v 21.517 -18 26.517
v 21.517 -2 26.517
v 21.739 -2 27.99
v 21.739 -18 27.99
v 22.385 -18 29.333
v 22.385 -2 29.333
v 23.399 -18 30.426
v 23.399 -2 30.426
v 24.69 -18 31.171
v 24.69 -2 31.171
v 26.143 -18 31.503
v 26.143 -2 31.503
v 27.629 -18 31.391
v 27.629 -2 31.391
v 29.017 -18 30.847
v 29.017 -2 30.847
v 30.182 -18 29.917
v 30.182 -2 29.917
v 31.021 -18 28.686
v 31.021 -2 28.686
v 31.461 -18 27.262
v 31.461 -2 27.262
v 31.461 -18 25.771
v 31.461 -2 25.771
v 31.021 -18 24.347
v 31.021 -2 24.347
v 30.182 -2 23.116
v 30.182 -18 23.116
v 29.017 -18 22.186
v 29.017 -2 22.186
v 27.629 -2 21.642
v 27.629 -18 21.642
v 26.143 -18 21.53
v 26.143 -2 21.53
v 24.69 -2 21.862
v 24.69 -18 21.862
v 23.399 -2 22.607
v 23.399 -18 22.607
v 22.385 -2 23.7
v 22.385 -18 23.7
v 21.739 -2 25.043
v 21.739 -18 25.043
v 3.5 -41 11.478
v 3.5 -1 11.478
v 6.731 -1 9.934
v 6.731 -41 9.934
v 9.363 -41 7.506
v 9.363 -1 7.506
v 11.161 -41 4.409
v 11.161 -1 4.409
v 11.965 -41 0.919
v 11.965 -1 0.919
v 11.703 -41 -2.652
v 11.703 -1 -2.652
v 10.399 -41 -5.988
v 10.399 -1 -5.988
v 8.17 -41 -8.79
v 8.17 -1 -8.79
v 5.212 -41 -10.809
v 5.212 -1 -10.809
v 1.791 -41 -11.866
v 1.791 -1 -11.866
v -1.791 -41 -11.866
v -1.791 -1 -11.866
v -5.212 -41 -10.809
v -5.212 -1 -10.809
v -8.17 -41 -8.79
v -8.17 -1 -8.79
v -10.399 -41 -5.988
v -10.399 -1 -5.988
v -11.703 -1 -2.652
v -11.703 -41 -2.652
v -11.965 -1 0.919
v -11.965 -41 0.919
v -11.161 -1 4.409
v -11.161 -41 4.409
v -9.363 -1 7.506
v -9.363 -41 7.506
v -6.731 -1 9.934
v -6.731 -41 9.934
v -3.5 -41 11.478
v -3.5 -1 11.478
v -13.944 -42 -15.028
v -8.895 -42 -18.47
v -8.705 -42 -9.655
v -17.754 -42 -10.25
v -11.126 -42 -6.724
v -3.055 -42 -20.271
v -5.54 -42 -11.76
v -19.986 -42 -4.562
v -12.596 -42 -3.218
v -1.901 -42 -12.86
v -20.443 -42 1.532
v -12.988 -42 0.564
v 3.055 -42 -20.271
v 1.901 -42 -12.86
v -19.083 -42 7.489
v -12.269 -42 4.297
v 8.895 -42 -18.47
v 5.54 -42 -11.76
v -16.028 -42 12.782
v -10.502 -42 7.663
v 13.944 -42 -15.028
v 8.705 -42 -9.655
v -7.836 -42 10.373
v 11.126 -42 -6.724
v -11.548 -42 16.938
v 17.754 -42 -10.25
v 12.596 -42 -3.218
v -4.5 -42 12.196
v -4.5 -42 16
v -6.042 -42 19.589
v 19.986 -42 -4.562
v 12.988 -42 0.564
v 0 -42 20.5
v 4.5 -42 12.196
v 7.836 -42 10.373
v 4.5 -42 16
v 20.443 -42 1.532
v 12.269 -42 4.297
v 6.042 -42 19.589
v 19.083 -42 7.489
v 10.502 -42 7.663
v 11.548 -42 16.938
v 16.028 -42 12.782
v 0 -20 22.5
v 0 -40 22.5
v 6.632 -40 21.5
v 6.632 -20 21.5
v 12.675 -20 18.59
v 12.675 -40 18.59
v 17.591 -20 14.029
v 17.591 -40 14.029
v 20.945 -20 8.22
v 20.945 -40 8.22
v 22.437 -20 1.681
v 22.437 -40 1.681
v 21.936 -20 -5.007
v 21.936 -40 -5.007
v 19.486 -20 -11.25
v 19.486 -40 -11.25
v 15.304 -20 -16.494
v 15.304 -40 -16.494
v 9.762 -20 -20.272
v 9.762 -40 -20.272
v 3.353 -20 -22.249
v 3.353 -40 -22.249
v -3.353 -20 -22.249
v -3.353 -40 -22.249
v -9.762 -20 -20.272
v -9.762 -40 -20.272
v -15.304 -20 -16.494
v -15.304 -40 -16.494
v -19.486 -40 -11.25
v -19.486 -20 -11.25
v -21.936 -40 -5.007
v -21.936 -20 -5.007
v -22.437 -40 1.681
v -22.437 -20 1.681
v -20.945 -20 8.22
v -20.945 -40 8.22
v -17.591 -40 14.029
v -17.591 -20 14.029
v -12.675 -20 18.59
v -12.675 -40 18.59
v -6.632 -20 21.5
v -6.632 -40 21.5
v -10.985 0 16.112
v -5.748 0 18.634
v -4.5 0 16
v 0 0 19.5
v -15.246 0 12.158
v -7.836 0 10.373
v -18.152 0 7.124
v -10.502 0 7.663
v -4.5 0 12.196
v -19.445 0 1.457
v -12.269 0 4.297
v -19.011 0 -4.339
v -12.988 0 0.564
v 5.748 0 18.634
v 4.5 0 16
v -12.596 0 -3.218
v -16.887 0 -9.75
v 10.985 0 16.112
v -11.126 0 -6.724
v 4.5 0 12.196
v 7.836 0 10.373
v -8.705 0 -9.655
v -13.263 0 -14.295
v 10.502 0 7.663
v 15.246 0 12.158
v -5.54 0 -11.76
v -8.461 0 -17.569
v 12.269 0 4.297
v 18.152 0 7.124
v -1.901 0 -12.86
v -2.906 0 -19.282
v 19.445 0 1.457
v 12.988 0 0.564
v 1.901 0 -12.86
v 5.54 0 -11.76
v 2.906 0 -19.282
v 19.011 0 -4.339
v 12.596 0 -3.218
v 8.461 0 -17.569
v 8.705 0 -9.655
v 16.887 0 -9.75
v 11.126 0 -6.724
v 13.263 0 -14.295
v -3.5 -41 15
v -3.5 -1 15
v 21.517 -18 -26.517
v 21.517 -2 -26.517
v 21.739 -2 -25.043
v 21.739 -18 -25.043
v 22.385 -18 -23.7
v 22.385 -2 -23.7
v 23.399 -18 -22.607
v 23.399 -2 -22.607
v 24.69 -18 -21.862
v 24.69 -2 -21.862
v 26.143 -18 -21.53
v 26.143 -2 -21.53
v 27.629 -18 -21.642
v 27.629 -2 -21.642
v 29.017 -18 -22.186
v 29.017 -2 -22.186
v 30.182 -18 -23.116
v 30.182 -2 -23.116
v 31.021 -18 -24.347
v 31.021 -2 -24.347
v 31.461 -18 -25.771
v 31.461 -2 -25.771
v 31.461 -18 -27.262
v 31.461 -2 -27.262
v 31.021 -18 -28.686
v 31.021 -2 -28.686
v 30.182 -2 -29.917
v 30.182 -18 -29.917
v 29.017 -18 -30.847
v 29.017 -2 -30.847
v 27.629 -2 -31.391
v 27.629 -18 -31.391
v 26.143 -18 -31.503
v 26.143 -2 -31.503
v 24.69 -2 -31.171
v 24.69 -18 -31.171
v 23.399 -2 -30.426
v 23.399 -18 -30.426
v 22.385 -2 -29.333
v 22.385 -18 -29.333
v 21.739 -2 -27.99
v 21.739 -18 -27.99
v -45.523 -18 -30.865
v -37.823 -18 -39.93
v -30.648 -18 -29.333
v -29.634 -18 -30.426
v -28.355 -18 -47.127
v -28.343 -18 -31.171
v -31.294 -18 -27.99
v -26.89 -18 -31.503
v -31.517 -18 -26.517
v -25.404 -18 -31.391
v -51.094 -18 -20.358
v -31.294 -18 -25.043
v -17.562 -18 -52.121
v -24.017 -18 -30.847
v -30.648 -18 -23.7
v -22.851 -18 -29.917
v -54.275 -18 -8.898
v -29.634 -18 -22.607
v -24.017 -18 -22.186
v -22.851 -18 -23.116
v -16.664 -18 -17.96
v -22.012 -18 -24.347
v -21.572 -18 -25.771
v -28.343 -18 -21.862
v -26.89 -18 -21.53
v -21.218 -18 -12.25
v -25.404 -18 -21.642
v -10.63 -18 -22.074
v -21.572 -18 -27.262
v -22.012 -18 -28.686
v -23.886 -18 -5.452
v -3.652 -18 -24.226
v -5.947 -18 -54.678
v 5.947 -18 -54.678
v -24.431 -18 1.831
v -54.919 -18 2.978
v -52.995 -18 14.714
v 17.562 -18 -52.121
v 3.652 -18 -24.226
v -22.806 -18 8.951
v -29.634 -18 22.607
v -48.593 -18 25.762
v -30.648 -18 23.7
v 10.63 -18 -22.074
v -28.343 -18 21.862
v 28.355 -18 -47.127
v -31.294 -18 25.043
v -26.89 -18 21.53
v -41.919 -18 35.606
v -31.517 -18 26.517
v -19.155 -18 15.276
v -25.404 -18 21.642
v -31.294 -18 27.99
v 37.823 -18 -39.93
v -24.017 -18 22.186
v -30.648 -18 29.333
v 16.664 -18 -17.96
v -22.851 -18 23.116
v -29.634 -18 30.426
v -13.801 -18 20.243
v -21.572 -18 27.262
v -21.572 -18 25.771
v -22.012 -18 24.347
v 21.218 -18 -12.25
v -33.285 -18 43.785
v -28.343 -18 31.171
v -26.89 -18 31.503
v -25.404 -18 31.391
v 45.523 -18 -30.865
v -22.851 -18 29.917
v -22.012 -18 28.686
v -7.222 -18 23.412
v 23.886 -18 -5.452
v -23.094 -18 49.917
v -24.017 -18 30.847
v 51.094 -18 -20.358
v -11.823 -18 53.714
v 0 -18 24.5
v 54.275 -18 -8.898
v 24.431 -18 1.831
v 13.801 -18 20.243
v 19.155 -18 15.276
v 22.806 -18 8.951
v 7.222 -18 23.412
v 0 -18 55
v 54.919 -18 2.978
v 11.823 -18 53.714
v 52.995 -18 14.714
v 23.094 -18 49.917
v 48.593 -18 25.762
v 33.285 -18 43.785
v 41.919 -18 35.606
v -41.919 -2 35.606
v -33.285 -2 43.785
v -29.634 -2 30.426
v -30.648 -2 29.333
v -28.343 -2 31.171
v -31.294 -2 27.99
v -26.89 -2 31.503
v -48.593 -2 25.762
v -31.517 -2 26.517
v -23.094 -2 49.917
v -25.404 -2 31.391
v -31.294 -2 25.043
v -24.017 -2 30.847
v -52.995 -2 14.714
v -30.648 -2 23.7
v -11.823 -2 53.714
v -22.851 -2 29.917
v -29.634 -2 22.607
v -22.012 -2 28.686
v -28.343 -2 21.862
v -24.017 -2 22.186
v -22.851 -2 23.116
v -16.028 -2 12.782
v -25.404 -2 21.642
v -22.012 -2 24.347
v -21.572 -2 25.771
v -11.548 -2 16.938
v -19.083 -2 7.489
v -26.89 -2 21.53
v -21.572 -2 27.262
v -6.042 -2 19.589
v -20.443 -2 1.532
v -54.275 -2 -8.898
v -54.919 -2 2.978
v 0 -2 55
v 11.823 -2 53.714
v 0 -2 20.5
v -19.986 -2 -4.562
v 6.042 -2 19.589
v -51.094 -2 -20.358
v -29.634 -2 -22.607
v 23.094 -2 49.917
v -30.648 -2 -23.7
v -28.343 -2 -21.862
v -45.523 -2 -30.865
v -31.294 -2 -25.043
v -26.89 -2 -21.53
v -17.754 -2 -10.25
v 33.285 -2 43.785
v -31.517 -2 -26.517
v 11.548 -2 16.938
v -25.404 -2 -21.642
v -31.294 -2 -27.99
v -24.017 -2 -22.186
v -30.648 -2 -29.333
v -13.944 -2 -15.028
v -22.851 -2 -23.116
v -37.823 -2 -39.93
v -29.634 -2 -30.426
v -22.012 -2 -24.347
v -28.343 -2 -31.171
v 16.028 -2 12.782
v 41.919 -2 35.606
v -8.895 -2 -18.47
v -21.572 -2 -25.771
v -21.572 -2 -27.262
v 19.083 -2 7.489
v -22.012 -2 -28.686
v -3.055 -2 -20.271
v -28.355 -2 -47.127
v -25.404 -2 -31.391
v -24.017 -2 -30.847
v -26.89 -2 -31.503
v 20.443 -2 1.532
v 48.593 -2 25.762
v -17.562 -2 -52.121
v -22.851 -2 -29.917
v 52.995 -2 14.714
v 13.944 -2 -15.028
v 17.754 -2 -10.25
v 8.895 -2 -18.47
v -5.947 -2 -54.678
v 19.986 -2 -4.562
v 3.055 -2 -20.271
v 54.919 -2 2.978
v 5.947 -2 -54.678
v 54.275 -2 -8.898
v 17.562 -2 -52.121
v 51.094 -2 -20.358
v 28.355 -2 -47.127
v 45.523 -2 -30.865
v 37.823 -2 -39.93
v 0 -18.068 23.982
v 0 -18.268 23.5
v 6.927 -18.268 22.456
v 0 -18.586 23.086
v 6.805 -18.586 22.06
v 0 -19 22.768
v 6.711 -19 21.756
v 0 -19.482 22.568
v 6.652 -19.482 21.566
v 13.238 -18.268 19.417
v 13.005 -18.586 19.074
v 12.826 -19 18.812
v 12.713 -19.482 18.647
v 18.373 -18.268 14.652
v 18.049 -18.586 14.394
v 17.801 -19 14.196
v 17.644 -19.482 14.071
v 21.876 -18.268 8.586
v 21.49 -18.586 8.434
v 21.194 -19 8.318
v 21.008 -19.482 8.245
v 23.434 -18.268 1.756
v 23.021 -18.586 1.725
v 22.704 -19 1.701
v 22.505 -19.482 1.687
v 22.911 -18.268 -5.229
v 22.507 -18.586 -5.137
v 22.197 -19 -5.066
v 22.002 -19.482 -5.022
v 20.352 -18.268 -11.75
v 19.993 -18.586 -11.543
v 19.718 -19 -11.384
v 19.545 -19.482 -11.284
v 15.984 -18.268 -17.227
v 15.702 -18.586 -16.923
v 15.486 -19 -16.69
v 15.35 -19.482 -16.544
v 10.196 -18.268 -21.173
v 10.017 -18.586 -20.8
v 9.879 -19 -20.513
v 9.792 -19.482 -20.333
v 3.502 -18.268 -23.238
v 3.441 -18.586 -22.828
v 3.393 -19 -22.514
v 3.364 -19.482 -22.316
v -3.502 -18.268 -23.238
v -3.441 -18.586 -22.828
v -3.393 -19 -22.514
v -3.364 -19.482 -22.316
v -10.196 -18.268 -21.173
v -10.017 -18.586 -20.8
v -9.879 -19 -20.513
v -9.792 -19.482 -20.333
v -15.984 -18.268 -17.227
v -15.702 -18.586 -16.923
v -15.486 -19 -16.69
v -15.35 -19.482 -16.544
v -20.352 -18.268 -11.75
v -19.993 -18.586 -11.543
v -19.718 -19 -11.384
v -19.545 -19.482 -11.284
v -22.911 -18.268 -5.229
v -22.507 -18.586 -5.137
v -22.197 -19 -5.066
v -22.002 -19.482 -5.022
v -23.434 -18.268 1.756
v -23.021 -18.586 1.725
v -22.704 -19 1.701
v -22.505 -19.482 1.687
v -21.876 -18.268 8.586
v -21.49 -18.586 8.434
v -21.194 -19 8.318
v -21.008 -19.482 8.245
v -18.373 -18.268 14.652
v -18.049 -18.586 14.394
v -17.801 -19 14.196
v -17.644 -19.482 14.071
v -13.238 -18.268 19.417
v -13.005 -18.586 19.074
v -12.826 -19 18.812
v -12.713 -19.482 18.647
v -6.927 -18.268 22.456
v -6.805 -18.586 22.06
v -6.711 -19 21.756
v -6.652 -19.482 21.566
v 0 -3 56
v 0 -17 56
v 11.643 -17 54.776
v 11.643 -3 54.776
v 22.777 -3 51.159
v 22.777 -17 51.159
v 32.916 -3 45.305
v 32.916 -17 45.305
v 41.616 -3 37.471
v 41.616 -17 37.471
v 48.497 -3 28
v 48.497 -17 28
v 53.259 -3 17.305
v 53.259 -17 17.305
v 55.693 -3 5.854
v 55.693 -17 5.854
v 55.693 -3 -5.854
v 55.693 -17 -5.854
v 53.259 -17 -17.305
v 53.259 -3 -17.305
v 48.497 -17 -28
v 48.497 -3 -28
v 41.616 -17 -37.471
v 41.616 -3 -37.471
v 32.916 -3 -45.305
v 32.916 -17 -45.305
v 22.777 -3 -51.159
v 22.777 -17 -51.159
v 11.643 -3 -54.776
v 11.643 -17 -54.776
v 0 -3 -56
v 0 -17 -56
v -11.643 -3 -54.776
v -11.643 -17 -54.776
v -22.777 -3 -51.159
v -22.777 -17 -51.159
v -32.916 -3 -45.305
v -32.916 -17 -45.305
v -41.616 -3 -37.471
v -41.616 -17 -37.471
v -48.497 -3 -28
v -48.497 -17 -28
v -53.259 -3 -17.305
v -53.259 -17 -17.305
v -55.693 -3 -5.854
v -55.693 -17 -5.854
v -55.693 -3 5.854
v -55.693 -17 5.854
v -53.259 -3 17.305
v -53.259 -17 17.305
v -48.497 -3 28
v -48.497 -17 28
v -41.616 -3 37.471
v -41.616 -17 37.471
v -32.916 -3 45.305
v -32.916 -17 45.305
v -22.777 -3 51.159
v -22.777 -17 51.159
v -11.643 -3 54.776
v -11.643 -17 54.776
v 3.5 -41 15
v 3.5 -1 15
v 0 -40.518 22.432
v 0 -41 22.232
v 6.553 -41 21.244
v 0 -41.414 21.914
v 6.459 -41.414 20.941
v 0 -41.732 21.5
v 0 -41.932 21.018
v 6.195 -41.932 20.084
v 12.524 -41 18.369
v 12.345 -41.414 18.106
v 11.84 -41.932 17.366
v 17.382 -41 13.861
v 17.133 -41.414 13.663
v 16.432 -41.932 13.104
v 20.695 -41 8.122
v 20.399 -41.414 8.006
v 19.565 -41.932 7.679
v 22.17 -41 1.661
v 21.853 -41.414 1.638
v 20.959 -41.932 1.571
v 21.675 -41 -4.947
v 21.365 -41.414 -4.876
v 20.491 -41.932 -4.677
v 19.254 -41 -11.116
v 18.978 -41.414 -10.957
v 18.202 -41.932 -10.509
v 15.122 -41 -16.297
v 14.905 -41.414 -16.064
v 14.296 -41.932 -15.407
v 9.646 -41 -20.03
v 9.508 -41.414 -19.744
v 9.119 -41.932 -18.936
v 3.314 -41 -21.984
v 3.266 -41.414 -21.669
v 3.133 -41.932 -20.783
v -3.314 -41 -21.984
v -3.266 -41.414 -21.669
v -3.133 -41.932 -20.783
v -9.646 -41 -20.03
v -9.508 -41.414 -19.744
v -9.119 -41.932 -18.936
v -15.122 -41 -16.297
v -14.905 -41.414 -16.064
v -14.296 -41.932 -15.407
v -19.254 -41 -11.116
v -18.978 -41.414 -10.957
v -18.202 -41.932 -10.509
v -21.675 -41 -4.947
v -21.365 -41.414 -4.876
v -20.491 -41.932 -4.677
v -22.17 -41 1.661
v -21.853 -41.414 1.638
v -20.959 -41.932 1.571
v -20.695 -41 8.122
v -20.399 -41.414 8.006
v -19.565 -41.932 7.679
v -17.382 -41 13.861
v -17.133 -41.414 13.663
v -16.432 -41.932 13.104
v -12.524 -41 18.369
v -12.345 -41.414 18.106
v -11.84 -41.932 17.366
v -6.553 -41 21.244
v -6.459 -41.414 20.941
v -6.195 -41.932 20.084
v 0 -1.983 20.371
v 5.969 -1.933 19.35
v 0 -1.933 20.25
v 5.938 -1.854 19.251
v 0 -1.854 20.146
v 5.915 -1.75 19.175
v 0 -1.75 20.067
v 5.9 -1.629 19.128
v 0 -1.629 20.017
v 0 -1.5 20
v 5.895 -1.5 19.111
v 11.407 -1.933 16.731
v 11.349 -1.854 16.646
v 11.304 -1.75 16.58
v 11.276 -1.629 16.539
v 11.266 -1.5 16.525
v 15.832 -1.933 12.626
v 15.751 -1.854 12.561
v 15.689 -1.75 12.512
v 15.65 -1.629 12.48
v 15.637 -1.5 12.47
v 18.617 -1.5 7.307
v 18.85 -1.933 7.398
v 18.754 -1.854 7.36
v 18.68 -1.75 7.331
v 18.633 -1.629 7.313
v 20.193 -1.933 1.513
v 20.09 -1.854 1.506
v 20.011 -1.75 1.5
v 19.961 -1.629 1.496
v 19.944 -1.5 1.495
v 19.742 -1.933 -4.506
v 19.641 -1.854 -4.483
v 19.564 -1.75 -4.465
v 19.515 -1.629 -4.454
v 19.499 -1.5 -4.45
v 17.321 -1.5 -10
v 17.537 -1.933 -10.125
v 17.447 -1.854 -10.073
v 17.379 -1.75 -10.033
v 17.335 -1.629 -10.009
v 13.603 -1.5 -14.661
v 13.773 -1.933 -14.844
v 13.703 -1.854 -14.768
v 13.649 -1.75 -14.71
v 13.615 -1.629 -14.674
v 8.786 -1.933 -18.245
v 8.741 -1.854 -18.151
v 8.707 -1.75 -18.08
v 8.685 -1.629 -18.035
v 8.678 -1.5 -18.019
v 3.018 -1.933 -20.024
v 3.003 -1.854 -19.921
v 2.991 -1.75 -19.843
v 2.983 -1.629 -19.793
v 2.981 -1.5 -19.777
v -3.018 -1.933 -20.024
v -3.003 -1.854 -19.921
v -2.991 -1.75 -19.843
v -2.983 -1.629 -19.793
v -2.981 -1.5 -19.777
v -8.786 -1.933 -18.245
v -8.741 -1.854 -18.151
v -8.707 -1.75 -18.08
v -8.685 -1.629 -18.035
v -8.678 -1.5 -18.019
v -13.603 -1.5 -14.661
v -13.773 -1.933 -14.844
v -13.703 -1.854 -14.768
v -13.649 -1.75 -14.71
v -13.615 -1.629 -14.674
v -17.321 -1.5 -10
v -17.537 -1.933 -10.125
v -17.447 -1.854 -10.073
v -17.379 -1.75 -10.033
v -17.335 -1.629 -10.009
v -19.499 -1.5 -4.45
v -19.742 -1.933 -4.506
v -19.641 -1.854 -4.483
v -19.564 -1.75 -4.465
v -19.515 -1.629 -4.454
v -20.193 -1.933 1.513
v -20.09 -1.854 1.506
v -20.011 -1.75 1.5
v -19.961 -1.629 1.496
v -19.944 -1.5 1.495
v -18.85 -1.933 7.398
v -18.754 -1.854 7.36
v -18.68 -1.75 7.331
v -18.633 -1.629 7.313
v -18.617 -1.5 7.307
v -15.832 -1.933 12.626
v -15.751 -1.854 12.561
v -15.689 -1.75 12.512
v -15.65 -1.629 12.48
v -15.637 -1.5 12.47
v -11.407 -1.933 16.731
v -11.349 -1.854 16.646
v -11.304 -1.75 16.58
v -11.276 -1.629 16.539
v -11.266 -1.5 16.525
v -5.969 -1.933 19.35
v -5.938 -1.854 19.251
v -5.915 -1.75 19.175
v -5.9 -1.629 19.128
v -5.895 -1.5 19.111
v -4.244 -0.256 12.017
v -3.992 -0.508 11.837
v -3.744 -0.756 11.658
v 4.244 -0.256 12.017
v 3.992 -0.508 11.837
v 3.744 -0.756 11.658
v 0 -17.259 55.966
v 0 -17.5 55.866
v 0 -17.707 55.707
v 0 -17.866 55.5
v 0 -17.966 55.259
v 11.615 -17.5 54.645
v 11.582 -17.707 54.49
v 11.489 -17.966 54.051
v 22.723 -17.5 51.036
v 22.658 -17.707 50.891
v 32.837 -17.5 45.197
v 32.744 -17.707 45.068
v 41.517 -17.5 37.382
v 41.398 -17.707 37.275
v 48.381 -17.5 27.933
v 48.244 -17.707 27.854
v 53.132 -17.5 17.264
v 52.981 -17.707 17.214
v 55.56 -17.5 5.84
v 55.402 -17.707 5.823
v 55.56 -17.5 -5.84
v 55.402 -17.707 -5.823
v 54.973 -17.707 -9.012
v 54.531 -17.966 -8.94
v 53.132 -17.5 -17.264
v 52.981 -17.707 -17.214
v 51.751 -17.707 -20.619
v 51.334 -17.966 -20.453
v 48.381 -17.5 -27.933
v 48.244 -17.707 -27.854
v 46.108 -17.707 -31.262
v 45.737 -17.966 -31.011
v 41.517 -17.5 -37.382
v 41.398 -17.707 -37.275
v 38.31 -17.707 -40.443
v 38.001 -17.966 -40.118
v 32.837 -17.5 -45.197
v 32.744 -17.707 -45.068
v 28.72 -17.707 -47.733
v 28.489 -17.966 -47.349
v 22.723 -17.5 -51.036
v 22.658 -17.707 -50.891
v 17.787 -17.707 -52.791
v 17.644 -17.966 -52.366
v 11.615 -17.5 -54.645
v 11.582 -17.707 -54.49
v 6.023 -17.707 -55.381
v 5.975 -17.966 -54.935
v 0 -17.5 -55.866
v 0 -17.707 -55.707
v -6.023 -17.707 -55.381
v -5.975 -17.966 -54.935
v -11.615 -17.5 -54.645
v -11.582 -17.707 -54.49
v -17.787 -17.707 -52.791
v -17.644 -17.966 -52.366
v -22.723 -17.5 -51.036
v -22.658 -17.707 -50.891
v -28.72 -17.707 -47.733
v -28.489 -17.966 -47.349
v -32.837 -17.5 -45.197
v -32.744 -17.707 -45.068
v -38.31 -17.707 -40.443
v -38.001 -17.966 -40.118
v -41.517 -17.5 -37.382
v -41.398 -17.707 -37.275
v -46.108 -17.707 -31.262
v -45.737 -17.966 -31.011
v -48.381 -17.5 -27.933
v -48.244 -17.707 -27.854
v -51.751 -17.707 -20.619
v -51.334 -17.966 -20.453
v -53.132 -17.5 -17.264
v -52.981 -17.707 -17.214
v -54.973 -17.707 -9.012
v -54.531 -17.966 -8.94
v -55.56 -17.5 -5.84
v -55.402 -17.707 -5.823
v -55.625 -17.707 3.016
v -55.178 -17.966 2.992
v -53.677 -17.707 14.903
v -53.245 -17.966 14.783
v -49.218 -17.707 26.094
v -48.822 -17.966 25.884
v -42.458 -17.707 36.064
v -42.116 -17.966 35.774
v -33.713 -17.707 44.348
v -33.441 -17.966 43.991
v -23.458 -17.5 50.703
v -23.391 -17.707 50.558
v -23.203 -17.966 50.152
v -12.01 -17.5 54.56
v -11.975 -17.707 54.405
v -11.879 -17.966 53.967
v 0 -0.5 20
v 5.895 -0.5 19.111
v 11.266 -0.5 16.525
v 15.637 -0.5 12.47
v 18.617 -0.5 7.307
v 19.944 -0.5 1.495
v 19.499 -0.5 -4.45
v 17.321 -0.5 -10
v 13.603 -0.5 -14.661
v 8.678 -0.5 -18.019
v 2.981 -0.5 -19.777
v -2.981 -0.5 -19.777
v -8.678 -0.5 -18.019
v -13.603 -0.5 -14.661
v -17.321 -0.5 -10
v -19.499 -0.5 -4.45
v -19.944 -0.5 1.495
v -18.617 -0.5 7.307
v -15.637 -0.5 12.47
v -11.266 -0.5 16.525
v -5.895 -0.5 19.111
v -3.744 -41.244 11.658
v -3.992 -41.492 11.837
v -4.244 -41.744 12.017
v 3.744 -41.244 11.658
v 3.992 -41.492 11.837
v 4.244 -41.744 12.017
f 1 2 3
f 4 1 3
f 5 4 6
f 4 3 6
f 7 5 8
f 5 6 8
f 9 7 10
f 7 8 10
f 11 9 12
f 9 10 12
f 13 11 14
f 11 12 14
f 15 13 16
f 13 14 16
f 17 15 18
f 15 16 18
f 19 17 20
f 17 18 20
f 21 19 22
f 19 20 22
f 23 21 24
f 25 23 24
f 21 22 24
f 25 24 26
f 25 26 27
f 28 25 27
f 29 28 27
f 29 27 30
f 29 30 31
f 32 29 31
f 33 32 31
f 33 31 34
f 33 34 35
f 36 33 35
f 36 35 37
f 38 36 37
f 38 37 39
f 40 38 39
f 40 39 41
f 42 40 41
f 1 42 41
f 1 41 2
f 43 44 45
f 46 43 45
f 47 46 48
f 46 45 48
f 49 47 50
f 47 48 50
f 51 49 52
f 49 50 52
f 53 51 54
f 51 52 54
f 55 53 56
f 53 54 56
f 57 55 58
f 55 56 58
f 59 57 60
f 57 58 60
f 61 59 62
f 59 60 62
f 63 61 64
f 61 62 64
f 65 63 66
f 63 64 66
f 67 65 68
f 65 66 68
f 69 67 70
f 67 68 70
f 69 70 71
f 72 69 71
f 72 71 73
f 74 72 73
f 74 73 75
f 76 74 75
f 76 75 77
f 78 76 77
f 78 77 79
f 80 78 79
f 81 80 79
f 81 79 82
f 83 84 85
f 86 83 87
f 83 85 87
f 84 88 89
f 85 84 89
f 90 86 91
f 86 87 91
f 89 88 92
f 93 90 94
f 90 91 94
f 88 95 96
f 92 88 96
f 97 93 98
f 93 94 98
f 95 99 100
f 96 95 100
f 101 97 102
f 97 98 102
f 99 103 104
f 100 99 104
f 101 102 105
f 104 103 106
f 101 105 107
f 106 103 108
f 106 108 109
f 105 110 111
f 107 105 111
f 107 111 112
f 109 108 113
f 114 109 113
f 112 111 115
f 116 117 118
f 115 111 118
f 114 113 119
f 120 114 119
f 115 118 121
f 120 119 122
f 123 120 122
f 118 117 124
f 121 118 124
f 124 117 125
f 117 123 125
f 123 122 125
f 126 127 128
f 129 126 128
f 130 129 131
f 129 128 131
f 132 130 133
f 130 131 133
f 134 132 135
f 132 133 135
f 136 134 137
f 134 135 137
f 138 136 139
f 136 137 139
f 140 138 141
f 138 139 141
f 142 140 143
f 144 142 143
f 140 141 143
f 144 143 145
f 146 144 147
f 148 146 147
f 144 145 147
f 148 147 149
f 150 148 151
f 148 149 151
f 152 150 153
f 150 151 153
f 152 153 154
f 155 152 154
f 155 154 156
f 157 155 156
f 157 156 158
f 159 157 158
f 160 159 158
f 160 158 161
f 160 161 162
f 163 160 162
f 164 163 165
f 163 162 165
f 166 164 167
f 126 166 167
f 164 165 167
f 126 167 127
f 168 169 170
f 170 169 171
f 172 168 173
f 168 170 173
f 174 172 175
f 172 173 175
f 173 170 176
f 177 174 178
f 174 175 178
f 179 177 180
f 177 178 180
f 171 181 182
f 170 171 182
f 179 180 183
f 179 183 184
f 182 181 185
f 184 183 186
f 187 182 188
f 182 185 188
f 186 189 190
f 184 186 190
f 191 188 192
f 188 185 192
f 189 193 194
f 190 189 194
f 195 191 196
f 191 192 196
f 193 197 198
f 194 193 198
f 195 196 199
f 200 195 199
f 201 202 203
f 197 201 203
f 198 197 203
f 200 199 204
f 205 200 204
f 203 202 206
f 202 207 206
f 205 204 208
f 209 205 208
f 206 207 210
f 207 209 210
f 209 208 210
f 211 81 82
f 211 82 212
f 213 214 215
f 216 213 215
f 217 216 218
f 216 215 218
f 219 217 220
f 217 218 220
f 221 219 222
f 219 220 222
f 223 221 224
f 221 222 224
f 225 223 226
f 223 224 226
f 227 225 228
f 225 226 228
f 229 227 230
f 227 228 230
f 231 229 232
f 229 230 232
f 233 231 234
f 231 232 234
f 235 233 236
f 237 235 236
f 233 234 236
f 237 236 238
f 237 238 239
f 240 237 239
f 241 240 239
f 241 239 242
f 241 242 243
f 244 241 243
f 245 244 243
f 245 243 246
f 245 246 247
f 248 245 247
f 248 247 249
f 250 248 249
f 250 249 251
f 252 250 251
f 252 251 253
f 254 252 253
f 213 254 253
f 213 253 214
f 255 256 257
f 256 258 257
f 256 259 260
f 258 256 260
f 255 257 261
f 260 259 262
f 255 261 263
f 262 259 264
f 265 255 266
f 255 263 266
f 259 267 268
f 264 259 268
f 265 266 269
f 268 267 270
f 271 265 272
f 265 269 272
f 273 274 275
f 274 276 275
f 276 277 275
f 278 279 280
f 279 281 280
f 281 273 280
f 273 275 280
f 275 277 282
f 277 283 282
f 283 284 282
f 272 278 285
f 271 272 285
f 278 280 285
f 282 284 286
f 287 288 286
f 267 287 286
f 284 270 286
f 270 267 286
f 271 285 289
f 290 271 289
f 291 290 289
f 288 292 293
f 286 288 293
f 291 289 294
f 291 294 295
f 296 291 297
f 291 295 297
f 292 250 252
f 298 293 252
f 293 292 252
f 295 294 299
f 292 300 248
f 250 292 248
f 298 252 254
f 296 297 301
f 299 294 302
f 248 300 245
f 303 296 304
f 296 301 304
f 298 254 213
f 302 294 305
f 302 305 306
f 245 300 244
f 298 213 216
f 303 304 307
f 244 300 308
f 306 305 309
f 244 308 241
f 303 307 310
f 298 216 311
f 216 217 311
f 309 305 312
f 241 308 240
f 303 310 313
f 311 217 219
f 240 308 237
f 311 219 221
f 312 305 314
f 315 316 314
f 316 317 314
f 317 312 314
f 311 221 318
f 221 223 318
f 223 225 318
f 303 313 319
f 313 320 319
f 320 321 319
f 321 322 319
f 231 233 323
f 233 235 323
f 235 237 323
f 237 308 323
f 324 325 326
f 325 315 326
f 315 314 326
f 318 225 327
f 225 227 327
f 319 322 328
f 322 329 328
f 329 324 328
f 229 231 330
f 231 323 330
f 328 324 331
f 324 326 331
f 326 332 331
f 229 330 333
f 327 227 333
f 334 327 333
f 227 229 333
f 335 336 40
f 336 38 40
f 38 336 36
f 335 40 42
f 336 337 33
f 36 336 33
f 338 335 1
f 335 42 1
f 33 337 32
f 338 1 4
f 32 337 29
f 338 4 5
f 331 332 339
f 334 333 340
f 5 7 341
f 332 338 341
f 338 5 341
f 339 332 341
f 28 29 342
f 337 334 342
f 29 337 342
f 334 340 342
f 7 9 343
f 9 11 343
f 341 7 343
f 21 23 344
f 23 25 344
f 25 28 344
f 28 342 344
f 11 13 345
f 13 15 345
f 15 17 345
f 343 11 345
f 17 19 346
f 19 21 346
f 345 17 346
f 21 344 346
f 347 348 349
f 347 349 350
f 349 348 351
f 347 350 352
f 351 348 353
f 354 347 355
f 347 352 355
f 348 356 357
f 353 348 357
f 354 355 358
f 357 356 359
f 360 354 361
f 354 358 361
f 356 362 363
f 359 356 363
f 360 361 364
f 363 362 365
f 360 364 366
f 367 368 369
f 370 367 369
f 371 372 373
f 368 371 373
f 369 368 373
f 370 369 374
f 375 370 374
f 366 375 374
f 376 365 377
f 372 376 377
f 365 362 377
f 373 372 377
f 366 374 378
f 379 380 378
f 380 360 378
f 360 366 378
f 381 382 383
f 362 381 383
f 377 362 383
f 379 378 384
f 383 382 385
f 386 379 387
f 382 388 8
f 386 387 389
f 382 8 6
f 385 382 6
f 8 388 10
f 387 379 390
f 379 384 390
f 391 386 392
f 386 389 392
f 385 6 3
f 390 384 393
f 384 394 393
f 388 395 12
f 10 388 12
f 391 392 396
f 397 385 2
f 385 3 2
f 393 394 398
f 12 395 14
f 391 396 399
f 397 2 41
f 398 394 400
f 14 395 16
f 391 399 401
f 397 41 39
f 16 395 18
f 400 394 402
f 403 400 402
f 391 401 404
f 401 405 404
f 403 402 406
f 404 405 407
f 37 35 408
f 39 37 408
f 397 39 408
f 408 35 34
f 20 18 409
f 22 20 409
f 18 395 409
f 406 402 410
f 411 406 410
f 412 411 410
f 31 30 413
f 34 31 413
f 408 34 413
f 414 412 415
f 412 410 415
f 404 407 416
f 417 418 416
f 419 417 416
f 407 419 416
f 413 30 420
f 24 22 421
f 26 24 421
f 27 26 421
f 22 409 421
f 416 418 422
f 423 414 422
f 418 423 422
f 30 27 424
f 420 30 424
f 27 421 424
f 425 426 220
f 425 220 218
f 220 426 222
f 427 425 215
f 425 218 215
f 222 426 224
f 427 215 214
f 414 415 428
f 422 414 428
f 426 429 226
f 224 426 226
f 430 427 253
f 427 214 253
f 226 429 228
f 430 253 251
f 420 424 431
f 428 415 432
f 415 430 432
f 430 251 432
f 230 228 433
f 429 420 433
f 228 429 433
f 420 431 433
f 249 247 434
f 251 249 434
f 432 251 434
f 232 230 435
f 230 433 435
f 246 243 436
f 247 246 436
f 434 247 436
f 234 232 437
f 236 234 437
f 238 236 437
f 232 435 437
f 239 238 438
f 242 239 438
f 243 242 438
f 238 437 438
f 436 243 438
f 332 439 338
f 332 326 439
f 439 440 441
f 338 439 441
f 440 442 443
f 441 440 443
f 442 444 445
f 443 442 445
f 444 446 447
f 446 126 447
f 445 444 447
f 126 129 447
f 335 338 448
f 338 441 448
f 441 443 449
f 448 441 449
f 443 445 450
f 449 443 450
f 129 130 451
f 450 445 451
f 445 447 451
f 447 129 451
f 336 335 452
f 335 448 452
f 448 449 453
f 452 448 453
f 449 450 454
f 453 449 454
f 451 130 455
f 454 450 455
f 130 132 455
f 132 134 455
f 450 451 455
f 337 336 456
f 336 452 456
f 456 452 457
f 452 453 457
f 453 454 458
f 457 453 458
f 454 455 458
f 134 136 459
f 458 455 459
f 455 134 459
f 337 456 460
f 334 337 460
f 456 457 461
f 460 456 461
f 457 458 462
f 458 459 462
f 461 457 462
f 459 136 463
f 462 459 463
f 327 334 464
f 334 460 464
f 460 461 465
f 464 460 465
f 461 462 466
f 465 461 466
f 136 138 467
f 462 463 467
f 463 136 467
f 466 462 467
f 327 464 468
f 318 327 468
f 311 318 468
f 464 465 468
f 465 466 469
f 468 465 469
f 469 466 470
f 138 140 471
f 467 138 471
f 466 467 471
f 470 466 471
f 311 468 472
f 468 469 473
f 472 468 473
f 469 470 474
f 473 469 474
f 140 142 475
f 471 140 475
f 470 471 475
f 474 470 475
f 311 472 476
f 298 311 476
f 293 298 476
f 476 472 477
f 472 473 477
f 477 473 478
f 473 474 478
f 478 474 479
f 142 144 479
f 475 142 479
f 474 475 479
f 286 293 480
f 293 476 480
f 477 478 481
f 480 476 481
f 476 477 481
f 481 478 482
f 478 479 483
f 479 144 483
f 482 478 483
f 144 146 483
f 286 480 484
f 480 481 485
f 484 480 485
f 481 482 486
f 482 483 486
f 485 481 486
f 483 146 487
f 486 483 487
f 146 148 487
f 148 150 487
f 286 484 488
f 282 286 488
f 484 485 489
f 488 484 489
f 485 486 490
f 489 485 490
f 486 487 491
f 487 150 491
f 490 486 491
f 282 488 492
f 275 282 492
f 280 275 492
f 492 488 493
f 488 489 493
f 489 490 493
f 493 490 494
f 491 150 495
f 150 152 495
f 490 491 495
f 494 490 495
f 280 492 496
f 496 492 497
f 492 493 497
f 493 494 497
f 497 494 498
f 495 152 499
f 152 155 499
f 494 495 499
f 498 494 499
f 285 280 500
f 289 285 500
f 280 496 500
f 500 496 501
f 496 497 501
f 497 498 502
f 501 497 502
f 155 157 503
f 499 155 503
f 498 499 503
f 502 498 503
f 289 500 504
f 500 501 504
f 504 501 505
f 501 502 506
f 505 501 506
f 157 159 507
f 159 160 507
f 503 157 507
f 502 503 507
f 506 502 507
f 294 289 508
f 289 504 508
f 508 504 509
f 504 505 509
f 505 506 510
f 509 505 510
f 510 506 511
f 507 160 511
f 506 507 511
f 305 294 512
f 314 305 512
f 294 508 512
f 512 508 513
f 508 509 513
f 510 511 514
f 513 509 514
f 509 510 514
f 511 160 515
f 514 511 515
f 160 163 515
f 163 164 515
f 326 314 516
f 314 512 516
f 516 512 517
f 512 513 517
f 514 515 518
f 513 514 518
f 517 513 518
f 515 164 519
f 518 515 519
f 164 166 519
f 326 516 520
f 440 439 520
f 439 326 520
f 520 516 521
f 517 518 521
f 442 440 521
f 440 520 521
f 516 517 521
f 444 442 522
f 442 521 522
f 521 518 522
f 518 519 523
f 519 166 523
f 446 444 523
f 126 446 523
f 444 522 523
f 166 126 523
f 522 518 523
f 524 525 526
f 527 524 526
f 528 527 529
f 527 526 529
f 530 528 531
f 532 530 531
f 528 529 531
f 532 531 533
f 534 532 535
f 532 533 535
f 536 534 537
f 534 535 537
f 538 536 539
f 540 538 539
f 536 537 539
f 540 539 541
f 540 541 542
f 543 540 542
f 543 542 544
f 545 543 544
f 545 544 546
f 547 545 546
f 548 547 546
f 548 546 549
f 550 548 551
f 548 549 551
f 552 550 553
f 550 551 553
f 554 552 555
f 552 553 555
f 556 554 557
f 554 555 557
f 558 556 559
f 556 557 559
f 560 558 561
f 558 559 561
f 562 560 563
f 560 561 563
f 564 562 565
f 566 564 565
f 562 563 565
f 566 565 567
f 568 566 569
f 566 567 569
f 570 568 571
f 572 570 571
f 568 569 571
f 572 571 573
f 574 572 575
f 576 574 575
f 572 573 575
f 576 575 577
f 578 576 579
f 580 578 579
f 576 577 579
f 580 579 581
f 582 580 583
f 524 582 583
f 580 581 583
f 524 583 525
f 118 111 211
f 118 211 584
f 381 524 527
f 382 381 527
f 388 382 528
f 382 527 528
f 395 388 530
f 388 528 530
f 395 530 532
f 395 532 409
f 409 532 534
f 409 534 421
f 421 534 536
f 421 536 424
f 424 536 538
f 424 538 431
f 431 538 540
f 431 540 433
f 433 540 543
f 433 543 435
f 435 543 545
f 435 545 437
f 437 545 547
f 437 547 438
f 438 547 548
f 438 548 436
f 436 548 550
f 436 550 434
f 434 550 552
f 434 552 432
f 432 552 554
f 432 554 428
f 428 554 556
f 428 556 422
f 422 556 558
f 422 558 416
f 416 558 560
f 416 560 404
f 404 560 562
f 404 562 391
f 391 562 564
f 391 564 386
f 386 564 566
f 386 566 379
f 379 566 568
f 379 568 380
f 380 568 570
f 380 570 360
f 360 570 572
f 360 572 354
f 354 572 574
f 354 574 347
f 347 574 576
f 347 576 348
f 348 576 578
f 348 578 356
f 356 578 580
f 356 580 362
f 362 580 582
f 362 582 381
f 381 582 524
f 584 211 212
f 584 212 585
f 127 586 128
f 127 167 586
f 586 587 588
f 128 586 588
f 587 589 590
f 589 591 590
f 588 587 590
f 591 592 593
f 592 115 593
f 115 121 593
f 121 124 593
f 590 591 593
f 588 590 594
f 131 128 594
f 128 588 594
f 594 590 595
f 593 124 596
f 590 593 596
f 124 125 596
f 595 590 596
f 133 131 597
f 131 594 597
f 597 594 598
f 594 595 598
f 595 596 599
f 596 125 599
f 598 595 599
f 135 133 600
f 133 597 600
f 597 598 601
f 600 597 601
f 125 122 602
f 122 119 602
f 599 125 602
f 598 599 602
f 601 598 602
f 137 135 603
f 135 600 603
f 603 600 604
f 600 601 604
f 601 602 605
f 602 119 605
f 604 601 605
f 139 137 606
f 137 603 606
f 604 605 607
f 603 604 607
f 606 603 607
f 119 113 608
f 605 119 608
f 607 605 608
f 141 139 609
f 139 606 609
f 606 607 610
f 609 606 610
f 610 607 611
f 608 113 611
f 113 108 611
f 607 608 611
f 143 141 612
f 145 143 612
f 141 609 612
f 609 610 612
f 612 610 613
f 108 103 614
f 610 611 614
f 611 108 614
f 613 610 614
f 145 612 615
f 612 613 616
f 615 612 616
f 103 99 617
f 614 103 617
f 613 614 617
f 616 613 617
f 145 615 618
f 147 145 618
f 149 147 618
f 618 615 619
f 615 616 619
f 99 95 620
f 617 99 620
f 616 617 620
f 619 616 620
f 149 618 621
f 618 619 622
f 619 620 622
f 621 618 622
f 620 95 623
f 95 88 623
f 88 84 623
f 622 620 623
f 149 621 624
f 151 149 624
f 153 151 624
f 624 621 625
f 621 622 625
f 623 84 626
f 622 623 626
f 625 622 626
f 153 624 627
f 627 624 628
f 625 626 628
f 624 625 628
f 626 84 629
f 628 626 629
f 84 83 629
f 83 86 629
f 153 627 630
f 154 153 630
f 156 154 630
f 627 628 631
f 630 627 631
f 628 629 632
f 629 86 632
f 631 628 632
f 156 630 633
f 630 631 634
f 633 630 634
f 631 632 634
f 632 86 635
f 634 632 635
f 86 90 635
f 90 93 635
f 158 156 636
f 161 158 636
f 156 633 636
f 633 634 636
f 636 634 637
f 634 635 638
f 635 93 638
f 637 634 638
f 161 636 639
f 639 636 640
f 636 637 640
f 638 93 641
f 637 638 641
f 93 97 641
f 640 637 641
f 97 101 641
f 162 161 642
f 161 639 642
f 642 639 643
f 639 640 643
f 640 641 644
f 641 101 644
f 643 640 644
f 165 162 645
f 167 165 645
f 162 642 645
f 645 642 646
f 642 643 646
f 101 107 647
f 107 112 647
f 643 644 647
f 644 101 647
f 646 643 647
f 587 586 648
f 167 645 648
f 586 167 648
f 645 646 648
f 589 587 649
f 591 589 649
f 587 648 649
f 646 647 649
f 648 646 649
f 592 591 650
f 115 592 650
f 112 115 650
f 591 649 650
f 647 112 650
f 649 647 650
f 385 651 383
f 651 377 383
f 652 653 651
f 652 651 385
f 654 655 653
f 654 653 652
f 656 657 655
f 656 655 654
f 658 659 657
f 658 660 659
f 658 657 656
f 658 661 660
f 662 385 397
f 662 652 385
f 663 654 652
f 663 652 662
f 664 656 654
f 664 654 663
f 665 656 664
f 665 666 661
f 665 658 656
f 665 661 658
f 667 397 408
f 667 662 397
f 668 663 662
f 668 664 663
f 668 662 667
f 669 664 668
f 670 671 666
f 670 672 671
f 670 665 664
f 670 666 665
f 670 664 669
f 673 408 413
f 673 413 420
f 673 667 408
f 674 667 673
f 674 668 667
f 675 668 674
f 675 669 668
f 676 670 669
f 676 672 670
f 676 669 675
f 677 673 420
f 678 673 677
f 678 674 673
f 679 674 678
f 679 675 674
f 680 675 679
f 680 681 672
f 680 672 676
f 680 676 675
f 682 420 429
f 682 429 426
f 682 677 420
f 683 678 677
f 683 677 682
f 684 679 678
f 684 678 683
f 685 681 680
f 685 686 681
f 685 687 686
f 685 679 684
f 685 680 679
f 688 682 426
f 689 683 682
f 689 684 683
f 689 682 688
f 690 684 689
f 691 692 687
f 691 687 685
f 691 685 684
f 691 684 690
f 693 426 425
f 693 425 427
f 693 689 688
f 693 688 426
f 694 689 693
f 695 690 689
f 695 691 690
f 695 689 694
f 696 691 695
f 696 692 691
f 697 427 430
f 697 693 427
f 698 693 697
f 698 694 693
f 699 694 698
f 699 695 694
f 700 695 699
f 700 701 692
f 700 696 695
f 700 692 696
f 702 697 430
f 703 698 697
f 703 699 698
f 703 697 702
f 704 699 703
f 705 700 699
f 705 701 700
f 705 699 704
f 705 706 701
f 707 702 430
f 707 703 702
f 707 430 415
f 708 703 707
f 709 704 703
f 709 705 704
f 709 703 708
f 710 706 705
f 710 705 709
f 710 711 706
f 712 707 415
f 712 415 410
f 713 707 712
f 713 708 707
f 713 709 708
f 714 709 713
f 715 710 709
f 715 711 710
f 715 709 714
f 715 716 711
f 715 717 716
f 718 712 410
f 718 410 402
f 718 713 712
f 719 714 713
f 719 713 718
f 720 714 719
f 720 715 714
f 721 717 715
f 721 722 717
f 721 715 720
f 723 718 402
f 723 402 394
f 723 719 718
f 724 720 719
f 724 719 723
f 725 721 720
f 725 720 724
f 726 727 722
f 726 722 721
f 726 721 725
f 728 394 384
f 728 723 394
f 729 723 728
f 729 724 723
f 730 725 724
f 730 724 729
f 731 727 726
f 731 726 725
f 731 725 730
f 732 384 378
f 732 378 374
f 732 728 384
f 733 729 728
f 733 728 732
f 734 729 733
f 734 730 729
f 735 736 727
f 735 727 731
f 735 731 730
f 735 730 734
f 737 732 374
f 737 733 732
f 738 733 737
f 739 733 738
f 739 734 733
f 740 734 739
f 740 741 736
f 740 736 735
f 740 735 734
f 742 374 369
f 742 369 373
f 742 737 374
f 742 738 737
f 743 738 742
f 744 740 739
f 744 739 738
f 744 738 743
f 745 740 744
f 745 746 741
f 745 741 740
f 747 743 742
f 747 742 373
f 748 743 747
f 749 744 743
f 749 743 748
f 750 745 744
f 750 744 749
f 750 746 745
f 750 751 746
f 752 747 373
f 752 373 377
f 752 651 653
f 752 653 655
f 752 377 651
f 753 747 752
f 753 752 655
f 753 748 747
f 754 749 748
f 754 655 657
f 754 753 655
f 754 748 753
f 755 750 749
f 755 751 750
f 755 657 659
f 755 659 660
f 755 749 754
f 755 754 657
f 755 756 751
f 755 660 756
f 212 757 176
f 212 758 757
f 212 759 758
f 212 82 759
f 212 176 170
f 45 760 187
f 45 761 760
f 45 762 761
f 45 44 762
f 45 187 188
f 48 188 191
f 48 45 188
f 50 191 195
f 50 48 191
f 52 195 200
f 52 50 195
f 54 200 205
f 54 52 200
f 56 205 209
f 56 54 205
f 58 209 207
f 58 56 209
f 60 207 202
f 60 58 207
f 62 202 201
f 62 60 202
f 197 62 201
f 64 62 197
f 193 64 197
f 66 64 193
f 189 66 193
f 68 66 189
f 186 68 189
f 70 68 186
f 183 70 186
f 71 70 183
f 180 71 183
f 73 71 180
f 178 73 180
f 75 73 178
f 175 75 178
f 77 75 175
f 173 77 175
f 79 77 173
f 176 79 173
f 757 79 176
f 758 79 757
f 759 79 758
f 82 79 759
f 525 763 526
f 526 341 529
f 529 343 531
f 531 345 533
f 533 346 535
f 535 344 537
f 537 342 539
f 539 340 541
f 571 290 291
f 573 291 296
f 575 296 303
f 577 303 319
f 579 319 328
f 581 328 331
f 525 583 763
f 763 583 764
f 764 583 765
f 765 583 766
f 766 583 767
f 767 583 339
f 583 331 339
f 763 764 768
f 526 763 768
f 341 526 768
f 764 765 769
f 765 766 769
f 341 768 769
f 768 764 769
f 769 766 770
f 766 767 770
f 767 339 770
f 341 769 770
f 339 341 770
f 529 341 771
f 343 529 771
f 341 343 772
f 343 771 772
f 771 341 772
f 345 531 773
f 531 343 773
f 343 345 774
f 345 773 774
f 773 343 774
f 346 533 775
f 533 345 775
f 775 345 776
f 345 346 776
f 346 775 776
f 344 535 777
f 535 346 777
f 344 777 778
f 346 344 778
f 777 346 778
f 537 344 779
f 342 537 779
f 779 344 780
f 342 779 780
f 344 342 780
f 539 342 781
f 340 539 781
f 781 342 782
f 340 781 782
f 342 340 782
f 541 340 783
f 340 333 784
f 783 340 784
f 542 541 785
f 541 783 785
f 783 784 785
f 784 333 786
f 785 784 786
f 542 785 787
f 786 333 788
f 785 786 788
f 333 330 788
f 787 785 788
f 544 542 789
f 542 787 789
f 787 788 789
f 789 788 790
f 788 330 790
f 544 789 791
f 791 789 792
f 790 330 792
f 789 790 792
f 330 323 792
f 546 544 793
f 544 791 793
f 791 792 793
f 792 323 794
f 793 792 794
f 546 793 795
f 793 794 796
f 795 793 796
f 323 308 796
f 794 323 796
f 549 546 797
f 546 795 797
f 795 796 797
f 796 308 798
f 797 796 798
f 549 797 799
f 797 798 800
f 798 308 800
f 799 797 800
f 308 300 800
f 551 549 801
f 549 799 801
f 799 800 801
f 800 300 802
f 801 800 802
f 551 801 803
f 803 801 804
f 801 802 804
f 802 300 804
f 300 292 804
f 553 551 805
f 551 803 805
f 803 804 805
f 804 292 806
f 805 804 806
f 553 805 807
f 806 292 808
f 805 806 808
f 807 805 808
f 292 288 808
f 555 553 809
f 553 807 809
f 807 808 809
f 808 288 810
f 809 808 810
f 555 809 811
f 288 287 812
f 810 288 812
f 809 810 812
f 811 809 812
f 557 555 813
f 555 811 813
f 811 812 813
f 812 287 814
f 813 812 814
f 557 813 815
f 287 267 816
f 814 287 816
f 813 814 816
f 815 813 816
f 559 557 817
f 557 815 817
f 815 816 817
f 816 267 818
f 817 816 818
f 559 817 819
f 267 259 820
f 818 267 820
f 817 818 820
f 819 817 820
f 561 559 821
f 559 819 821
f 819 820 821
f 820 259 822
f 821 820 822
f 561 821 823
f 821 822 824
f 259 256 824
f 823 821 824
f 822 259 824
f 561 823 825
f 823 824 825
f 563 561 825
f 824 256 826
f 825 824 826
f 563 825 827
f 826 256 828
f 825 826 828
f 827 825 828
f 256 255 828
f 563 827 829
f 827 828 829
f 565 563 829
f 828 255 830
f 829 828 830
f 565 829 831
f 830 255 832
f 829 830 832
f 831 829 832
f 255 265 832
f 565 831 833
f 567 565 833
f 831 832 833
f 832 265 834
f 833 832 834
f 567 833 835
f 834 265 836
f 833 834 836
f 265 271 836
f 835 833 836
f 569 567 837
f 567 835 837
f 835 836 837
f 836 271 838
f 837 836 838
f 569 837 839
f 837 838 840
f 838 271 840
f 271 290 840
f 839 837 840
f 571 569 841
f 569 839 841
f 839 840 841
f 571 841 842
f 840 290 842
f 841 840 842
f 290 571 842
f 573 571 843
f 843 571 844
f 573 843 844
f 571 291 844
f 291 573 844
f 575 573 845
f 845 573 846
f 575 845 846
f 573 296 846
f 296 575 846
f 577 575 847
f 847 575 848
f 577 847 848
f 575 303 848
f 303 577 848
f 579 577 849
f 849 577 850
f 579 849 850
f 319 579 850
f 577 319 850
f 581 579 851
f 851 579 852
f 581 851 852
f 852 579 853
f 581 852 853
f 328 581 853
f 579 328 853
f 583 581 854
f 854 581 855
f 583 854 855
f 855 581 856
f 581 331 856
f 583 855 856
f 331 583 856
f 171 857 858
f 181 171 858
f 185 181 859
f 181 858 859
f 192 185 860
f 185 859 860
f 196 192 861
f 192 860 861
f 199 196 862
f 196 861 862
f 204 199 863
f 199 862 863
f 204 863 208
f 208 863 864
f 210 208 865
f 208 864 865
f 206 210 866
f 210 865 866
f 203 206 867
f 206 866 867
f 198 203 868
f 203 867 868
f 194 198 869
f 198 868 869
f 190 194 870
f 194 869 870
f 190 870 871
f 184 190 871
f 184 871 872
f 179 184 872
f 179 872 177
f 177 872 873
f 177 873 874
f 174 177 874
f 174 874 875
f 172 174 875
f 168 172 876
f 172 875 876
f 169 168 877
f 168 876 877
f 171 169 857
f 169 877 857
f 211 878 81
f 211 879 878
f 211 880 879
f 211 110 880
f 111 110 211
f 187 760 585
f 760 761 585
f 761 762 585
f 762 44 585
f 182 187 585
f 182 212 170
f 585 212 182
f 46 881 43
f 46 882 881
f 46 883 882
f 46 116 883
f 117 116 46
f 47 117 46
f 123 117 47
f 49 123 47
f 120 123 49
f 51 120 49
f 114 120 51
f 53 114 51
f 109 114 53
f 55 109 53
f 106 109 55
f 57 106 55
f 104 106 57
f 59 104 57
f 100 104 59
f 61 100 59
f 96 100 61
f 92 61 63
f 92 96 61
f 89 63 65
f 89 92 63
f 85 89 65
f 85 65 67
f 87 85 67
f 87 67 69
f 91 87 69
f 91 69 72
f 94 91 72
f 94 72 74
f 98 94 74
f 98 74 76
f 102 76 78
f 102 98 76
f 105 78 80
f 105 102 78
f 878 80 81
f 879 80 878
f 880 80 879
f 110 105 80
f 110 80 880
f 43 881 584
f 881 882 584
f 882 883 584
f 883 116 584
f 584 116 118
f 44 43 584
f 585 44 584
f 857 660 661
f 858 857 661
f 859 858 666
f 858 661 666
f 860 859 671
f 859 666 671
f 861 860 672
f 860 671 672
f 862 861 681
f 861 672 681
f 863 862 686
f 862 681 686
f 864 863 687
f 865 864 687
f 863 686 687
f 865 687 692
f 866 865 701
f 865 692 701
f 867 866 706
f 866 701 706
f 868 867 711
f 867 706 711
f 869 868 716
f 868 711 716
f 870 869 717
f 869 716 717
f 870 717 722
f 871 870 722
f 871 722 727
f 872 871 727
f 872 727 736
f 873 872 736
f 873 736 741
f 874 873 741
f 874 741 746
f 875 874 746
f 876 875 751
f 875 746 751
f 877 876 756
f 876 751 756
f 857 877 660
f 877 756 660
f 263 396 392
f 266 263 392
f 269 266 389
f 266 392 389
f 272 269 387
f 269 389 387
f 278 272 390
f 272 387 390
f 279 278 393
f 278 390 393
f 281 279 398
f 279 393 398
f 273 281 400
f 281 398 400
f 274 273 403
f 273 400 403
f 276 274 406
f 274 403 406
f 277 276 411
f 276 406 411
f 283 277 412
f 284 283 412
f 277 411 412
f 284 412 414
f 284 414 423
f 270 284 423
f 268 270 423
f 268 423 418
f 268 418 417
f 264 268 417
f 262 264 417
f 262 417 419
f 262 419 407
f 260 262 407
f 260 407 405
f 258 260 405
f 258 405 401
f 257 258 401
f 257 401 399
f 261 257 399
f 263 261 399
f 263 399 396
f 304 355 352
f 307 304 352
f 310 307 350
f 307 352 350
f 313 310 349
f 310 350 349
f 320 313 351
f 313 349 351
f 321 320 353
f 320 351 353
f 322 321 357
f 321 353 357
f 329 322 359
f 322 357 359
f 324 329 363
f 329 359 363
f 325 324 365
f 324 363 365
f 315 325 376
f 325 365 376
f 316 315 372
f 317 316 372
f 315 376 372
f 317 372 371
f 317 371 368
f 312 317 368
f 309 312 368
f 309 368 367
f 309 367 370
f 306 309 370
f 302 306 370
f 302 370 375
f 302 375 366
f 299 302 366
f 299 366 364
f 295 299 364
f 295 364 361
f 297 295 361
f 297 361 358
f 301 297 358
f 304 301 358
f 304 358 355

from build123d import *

# Parameters (mm, degrees)
F2_W     = 7
F2_H     = 7
F3_DEPTH = 42.001
F5_D     = 10
F6_SIZE  = 1
F7_SIZE  = 0.5
F8_SIZE  = 1
F9_R     = 1
F10_R    = 2
F11_R    = 0.5


with BuildPart() as f1:
    # F0 (on Right) → F1 (revolve)
    with BuildSketch(Plane.YZ):
        Polygon((0, 12), (0, 20), (-2, 20), (-2, 56), (-18, 56), (-18, 22.5), (-42, 22.5), (-42, 12), align=None)
    revolve(axis=Axis((0, -17.673691, 0), (0, 1, 0)))

    # F2 (on face) → F3 (cut, through all)
    with BuildSketch(Plane.XZ.offset(42)):
        with Locations((0, 11.5)):
            Rectangle(F2_W, F2_H)
    extrude(amount=-F3_DEPTH, mode=Mode.SUBTRACT)

    # F5 (through all)
    with Locations(Plane.XZ.offset(18)):
        with Locations((26.516504, 26.516504), (26.516504, -26.516504), (-26.516504, 26.516504), (-26.516504, -26.516504)):
            Hole(F5_D / 2)

    # F6
    f6_edges = [f1.edges().sort_by_distance(p)[0] for p in [
        (3.5, -42, 13.23912),
        (3.5, 0, 13.23912),
        (-3.5, 0, 13.23912),
        (0, 0, 15),
        (0, 0, -12),
        (0, -42, -12),
        (-3.5, -42, 13.23912),
        (0, -42, 15),
    ]]
    chamfer(f6_edges, length=F6_SIZE)

    # F7
    f7_edges = [f1.edges().sort_by_distance(p)[0] for p in [
        (0, 0, -20),
    ]]
    chamfer(f7_edges, length=F7_SIZE)

    # F8
    f8_edges = [f1.edges().sort_by_distance(p)[0] for p in [
        (0, -2, -56),
    ]]
    chamfer(f8_edges, length=F8_SIZE)

    # F9
    f9_edges = [f1.edges().sort_by_distance(p)[0] for p in [
        (0, -18, -56),
    ]]
    fillet(f9_edges, radius=F9_R)

    # F10
    f10_edges = [f1.edges().sort_by_distance(p)[0] for p in [
        (0, -18, -22.5),
        (0, -42, -22.5),
    ]]
    fillet(f10_edges, radius=F10_R)

    # F11
    f11_edges = [f1.edges().sort_by_distance(p)[0] for p in [
        (0, -2, -20),
    ]]
    fillet(f11_edges, radius=F11_R)


solid = f1.part
